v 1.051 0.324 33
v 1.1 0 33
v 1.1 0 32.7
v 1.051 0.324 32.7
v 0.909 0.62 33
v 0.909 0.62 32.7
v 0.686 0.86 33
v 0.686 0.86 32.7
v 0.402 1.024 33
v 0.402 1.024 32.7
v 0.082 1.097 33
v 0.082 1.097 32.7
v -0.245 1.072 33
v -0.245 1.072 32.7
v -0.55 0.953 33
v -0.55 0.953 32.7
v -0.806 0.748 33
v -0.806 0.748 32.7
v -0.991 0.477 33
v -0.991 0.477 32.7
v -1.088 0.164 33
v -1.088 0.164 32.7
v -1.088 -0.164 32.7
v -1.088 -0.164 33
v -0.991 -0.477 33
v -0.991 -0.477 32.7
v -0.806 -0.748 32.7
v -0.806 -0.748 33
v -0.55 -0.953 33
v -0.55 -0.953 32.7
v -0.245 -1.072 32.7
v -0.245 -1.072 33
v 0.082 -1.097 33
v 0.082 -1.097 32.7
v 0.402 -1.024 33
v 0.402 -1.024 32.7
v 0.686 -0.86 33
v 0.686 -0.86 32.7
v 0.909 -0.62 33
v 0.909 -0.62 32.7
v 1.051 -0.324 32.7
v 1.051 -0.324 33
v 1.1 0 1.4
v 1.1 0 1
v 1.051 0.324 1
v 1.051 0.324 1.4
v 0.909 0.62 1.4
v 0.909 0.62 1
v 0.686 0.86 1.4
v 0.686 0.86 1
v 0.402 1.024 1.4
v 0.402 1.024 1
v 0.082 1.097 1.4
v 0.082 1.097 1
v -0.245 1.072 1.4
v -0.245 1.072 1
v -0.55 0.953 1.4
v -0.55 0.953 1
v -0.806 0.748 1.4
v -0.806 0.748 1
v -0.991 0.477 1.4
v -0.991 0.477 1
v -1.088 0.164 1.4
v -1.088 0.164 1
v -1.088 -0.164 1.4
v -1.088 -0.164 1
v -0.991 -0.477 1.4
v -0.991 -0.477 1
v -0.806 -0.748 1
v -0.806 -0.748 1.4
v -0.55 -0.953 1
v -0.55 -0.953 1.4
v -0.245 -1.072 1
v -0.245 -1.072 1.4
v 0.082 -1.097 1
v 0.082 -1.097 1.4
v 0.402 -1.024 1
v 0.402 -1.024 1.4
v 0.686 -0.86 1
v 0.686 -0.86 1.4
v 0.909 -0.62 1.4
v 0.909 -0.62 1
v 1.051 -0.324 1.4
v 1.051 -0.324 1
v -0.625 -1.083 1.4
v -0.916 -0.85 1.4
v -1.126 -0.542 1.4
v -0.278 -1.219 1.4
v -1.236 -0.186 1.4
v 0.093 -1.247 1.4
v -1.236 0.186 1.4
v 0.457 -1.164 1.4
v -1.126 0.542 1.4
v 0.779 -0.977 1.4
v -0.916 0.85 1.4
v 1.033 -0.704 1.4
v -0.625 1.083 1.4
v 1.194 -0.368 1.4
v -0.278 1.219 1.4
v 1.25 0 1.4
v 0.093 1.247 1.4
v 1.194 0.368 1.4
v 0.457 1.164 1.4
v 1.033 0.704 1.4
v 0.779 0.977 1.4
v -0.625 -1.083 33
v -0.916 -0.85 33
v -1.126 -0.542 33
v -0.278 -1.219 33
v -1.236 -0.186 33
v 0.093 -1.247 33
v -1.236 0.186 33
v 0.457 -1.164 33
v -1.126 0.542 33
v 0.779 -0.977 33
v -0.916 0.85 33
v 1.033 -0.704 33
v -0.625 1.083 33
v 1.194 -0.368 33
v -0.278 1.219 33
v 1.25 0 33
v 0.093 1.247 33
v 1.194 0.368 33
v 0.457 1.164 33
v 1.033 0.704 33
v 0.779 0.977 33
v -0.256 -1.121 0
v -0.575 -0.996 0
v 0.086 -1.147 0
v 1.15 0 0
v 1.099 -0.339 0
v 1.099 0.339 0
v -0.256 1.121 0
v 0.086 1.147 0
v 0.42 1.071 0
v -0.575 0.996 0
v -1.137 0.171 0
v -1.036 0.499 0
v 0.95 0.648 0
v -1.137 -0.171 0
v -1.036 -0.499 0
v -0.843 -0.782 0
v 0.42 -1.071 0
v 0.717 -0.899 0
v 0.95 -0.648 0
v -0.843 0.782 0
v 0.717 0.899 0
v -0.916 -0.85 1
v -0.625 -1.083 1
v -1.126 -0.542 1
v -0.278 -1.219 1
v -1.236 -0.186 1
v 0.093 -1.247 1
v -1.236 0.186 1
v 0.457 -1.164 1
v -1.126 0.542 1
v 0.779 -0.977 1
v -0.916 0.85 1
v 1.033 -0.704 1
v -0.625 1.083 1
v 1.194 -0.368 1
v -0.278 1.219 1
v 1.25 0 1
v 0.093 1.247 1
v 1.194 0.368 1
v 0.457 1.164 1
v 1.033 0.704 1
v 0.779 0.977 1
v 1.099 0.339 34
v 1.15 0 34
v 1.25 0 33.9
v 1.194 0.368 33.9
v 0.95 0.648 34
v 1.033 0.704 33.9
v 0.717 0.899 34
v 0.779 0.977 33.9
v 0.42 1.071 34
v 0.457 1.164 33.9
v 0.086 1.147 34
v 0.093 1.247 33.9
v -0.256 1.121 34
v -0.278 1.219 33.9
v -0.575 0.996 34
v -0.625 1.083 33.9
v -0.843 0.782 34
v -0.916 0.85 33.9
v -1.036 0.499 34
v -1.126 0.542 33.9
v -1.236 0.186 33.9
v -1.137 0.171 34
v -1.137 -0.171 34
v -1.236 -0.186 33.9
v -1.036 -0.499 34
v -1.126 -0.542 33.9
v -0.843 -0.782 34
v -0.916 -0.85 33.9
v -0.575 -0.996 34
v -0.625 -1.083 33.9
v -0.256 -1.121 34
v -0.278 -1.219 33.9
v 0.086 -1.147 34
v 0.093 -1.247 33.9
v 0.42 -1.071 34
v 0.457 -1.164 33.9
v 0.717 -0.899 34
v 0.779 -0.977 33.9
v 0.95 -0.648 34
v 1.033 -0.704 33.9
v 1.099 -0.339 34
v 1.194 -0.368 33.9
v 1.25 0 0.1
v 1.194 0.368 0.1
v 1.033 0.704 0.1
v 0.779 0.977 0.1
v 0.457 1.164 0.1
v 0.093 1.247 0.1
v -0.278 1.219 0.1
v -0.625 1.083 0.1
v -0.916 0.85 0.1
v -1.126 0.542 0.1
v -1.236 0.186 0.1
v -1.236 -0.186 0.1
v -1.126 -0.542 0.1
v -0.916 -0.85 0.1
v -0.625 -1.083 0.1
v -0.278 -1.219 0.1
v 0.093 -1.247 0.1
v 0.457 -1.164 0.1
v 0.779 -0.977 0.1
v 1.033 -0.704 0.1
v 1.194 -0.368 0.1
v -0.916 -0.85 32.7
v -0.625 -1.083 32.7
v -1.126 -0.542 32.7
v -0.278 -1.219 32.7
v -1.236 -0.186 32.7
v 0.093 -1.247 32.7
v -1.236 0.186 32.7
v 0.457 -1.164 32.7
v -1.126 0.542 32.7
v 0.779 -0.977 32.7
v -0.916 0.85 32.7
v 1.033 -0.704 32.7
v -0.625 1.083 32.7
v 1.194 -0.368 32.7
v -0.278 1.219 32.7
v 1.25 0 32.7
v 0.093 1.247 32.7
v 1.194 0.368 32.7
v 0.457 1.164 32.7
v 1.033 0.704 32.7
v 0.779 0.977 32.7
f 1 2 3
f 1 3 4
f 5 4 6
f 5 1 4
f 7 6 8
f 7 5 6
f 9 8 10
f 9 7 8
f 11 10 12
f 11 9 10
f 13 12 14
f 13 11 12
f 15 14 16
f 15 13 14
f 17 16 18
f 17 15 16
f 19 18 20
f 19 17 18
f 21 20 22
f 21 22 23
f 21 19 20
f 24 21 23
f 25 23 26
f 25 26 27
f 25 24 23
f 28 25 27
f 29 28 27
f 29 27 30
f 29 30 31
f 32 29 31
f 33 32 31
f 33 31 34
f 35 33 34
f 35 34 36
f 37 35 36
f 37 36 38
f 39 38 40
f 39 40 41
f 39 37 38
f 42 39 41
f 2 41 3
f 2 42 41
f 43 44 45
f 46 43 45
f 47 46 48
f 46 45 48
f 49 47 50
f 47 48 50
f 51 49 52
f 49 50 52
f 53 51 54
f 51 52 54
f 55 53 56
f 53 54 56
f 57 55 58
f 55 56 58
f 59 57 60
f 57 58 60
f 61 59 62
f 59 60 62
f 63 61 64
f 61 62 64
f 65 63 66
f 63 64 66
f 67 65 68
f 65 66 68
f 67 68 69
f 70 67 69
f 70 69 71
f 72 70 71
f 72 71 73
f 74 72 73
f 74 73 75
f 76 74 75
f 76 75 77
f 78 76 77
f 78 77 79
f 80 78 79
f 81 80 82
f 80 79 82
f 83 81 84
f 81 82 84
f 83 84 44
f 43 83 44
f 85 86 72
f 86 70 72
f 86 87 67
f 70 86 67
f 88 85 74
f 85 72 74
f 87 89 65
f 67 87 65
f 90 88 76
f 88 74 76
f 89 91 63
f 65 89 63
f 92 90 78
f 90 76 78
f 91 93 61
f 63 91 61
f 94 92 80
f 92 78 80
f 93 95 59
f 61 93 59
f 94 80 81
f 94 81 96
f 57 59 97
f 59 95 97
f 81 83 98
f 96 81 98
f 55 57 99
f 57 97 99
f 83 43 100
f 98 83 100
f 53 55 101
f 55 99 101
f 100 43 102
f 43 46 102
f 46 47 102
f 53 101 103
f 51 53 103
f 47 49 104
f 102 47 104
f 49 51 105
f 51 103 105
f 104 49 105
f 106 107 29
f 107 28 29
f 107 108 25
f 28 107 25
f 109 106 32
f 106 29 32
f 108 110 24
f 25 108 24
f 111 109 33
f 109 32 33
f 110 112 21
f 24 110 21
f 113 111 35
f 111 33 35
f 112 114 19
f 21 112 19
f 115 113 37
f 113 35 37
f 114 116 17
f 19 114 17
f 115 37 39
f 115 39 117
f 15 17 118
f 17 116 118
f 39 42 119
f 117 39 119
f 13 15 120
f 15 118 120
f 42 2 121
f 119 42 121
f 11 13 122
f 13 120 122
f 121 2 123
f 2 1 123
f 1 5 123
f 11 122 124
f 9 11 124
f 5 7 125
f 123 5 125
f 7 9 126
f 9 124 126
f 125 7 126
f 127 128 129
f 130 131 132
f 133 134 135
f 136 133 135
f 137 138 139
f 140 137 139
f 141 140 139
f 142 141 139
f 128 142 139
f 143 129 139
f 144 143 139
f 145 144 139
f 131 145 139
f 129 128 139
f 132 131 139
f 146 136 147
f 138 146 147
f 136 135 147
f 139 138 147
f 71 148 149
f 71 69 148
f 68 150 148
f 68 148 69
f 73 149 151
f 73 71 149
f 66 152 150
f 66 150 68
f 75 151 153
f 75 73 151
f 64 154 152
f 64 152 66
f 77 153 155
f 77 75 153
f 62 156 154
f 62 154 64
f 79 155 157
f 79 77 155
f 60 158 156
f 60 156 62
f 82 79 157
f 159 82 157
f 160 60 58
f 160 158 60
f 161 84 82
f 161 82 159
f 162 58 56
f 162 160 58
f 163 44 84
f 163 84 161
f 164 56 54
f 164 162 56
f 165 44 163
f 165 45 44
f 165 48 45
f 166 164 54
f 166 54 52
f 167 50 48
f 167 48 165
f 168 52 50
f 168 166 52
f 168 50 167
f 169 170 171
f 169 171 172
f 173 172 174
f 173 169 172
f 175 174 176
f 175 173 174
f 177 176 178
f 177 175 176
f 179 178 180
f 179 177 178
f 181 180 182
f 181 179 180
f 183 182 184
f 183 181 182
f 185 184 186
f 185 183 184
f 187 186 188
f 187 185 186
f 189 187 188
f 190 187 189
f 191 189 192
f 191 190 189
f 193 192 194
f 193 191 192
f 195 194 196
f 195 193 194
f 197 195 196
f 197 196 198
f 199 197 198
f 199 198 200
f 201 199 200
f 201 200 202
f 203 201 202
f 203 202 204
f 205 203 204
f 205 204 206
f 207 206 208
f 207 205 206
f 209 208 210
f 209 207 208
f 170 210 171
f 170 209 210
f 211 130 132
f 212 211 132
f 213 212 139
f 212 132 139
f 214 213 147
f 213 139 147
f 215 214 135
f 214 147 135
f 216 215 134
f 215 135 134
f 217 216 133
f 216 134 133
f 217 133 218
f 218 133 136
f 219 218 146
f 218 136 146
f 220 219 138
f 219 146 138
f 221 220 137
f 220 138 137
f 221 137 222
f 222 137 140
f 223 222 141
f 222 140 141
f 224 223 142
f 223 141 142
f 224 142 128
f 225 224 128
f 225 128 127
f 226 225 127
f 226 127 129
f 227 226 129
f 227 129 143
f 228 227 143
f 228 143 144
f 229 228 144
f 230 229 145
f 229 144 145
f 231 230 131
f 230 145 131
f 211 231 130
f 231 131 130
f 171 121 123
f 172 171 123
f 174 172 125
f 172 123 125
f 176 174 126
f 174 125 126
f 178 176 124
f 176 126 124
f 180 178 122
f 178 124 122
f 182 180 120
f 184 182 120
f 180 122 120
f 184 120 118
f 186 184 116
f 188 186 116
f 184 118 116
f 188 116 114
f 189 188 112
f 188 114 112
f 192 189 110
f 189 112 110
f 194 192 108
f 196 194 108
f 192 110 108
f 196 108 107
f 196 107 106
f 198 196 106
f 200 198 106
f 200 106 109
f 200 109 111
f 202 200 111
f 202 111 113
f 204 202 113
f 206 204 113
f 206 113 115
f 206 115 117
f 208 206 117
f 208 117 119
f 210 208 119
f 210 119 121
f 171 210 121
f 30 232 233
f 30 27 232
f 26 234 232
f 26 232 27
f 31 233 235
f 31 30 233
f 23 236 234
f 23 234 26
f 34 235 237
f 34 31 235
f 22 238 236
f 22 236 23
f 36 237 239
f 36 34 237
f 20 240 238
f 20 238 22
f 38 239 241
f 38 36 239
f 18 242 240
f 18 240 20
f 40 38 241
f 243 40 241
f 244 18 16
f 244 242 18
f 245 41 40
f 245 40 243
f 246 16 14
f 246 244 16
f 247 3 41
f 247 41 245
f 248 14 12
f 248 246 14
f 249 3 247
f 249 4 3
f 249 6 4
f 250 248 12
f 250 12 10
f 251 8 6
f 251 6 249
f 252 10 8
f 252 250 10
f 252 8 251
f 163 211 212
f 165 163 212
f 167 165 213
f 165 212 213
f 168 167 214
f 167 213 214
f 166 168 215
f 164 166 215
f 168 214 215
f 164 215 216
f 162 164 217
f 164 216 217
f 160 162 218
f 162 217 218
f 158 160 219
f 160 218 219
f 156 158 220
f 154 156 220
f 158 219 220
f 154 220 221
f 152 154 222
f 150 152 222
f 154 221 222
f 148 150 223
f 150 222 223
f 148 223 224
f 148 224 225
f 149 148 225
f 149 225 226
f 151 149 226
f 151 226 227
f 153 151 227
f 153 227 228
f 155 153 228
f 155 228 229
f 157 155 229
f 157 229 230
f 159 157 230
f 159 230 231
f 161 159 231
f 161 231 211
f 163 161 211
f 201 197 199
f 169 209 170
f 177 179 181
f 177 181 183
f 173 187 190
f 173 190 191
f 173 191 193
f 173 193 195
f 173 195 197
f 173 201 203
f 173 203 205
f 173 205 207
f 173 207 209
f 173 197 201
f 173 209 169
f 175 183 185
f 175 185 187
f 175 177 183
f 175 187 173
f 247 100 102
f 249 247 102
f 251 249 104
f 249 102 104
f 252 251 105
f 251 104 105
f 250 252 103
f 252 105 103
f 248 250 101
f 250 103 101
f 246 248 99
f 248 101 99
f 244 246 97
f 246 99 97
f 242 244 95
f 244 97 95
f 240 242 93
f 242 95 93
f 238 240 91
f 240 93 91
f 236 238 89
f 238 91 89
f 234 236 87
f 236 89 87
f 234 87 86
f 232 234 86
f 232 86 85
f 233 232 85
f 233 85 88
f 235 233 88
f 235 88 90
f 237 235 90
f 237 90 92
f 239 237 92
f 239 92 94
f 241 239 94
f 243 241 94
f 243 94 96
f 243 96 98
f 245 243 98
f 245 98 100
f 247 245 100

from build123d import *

# Parameters (mm, degrees)
SKETCH_1_R          = 1.25
EXTRUDE_1_DEPTH     = 34
SKETCH_2_R          = 1.25
SKETCH_2_R_2        = 1.1
CUT_EXTRUDE_1_DEPTH = 0.4
SKETCH_3_R          = 1.25
SKETCH_3_R_2        = 1.1
CUT_EXTRUDE_2_DEPTH = 0.3
CHAMFER_1_SIZE      = 0.1


with BuildPart() as part:
    # 草图1 → 凸台-拉伸1 (new body)
    with BuildSketch(Plane.XY):
        Circle(SKETCH_1_R)
    extrude(amount=EXTRUDE_1_DEPTH)

    # 草图2 → 切除-拉伸1 (cut)
    with BuildSketch(Plane.XY.offset(1)):
        Circle(SKETCH_2_R)
        Circle(SKETCH_2_R_2, mode=Mode.SUBTRACT)
    extrude(amount=CUT_EXTRUDE_1_DEPTH, mode=Mode.SUBTRACT)

    # 草图3 → 切除-拉伸2 (cut)
    with BuildSketch(Plane.XY.offset(33)):
        Circle(SKETCH_3_R)
        Circle(SKETCH_3_R_2, mode=Mode.SUBTRACT)
    extrude(amount=-CUT_EXTRUDE_2_DEPTH, mode=Mode.SUBTRACT)

    # 倒角1
    chamfer_1_edges = [part.edges().sort_by_distance(p)[0] for p in [
        (-1.25, 0, 0),
        (-1.25, 0, 34),
    ]]
    chamfer(chamfer_1_edges, length=CHAMFER_1_SIZE)


solid = part.part
